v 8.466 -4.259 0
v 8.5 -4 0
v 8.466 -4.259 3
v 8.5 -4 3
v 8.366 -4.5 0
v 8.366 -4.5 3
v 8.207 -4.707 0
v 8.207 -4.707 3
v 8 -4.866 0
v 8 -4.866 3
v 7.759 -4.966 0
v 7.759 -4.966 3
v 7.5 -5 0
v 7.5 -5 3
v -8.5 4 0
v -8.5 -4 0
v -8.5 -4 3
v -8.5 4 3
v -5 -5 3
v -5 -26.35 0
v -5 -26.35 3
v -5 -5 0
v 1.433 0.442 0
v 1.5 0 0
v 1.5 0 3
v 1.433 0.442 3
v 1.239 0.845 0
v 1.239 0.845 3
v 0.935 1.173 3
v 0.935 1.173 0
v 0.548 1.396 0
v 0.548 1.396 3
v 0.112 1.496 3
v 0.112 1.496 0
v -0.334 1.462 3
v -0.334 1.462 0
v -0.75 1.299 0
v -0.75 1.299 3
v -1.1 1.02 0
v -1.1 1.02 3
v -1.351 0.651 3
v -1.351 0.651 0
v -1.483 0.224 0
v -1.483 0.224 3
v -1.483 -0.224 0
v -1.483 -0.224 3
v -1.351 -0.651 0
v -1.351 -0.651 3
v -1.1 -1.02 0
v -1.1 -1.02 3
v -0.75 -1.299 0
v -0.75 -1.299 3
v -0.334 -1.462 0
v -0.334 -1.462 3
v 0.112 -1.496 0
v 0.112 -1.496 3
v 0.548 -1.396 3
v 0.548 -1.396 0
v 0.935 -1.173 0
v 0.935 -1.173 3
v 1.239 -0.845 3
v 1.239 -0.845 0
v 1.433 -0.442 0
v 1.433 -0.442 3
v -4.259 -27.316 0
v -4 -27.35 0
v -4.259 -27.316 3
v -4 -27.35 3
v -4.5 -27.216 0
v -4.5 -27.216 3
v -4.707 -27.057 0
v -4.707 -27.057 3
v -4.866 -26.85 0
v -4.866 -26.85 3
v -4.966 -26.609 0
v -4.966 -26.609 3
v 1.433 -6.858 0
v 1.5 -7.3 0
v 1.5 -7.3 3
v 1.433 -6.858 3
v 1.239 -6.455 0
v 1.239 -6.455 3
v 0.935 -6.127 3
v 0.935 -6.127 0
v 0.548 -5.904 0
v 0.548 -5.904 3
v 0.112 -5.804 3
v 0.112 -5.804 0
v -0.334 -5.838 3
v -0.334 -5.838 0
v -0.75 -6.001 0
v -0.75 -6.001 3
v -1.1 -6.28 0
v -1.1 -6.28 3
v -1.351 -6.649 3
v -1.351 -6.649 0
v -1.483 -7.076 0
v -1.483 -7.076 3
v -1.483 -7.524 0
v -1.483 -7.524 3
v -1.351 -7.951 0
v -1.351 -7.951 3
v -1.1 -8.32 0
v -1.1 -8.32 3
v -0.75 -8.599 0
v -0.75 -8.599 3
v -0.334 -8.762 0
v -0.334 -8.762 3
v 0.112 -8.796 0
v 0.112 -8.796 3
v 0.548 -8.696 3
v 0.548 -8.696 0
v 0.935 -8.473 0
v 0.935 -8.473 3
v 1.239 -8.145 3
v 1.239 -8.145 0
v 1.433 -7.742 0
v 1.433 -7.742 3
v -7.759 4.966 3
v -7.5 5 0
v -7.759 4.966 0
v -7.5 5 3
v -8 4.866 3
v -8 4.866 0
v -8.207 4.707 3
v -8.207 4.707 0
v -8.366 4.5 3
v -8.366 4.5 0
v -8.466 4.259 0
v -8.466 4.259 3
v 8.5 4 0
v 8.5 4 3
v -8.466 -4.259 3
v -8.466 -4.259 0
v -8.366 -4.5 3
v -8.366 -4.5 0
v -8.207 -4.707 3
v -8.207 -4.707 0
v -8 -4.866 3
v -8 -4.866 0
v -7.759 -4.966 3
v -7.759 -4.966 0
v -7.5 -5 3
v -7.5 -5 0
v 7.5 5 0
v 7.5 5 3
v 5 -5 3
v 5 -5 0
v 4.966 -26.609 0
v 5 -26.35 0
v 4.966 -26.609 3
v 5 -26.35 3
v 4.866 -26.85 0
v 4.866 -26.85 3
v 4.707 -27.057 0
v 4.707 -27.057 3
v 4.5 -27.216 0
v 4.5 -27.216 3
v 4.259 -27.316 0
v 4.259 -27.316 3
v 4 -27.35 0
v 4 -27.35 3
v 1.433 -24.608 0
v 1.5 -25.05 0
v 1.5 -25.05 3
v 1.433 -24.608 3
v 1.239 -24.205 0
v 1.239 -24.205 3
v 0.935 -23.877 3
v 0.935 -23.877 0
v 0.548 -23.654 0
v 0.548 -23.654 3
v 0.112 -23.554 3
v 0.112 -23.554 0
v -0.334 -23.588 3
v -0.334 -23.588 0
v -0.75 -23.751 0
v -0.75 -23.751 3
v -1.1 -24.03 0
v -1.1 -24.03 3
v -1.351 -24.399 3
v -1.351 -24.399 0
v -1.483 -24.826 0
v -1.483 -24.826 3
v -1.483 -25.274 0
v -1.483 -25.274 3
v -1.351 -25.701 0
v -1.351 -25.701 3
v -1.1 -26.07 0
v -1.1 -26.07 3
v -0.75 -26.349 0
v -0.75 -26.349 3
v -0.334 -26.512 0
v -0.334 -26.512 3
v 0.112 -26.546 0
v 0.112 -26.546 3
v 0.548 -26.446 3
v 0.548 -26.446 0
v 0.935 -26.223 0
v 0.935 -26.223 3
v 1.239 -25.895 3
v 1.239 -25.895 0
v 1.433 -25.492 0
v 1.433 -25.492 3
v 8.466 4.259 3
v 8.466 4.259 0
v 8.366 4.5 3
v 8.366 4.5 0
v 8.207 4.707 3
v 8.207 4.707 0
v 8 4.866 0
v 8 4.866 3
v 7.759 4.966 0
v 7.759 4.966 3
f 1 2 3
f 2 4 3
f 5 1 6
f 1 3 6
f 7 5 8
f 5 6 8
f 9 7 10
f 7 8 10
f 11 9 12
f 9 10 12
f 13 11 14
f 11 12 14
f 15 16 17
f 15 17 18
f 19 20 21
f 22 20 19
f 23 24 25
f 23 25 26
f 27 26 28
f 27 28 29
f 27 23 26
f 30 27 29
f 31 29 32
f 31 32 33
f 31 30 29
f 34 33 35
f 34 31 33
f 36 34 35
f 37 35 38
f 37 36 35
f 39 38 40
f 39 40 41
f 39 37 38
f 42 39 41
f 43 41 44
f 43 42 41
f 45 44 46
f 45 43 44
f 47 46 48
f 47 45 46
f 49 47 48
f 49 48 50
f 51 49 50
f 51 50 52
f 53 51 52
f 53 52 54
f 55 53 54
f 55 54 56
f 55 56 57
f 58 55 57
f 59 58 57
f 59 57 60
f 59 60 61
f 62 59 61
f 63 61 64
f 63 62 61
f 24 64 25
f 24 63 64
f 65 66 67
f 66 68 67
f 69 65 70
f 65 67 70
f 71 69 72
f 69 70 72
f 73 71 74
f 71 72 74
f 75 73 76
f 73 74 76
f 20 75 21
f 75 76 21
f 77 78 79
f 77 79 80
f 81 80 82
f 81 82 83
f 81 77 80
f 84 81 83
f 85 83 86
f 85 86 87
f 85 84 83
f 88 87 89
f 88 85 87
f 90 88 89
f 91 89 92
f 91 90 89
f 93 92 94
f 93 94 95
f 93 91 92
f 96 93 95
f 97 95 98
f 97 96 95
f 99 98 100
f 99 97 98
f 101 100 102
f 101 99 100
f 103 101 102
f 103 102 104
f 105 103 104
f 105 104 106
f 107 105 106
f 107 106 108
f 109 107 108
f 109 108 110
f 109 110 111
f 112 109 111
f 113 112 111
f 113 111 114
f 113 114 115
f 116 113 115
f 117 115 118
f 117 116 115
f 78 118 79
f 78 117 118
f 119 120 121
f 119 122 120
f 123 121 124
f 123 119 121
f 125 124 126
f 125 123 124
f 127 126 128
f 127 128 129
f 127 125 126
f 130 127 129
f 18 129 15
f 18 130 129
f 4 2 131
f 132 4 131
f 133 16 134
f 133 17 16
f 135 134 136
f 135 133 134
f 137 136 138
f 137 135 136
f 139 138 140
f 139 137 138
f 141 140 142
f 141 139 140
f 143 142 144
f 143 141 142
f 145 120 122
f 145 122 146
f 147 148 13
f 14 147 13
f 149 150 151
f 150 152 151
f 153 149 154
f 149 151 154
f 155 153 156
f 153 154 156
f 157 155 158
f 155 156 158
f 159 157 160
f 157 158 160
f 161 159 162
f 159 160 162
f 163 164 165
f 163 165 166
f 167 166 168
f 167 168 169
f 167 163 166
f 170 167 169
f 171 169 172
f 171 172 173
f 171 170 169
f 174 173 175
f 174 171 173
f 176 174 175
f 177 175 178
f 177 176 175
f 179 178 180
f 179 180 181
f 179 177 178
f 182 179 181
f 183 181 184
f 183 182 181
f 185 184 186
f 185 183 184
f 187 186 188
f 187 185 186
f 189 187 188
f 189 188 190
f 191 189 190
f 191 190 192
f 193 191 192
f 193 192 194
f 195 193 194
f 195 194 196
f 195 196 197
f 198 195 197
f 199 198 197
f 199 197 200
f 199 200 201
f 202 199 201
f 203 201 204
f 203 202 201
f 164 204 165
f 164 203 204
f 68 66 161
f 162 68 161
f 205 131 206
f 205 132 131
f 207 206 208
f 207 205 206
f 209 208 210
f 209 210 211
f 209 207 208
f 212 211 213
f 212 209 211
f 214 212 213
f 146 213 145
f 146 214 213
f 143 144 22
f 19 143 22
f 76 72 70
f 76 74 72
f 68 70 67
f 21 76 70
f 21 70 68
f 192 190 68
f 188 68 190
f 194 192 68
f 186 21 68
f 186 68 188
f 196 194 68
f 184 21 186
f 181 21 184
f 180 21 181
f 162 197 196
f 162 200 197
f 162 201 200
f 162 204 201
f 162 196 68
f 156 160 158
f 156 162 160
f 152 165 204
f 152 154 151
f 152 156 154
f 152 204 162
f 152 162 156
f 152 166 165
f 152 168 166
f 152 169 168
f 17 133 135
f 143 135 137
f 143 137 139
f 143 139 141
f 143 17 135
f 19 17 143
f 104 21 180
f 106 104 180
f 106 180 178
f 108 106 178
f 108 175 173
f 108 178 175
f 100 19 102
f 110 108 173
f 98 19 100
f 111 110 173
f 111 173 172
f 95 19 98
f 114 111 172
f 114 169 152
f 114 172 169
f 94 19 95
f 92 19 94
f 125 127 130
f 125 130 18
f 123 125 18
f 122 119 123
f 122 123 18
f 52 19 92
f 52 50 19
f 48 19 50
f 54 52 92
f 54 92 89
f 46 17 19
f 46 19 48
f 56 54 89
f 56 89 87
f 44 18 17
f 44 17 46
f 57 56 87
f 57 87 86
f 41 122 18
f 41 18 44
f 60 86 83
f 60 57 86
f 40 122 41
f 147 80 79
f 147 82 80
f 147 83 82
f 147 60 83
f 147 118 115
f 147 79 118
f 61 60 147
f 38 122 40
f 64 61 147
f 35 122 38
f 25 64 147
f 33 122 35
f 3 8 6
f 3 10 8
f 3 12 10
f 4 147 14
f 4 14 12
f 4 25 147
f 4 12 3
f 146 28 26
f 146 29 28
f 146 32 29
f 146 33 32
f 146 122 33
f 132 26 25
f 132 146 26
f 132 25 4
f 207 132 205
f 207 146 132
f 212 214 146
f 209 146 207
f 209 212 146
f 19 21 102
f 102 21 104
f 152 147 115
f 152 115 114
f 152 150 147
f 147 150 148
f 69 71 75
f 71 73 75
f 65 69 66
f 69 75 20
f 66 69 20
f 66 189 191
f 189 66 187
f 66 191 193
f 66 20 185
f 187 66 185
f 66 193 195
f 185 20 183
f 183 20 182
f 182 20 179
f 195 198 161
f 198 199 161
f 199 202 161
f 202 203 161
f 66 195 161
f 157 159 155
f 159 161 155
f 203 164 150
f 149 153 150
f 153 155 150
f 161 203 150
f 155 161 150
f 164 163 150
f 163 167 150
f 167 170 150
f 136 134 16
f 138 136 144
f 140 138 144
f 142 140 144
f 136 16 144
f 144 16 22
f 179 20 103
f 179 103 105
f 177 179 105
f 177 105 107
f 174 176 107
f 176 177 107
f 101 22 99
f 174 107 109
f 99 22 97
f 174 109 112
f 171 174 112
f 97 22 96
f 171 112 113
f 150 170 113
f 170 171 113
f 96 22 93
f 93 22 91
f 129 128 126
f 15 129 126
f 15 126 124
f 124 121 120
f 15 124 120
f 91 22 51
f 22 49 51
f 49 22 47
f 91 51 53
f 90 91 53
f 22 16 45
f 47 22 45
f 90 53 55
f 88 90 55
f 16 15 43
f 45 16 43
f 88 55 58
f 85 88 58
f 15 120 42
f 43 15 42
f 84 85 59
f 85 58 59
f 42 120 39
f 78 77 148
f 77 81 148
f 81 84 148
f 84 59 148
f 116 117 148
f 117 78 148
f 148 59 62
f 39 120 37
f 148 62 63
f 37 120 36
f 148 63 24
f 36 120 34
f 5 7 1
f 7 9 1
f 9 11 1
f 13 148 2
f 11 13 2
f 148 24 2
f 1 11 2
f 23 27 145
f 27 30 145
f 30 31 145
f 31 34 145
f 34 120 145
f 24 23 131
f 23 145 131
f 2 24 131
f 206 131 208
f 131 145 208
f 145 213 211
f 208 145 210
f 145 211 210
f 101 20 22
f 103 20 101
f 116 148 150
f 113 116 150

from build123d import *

# Parameters (mm, degrees)
SKETCH2_W           = 17
SKETCH2_H           = 10
SKETCH2_R           = 1.5
SKETCH2_W_2         = 10
SKETCH2_H_2         = 22.35
BOSS_EXTRUDE1_DEPTH = 3
FILLET5_R           = 1
FILLET6_R           = 1
FILLET7_R           = 1


with BuildPart() as part:
    # Sketch2 → Boss-Extrude1 (new body)
    # profile 1 of 2: a face of its own
    with BuildSketch(Plane.XY):
        Rectangle(SKETCH2_W, SKETCH2_H)
        Circle(SKETCH2_R, mode=Mode.SUBTRACT)
    # profile 2 of 2: a face of its own
    with BuildSketch(Plane.XY):
        with Locations((0, -16.175)):
            Rectangle(SKETCH2_W_2, SKETCH2_H_2)
        with Locations((0, -7.3)):
            Circle(SKETCH2_R, mode=Mode.SUBTRACT)
        with Locations((0, -25.05)):
            Circle(SKETCH2_R, mode=Mode.SUBTRACT)
    extrude(amount=BOSS_EXTRUDE1_DEPTH)

    # Fillet5
    fillet5_edges = [part.edges().sort_by_distance(p)[0] for p in [
        (8.5, -5, 1.5),
    ]]
    fillet(fillet5_edges, radius=FILLET5_R)

    # Fillet6
    fillet6_edges = [part.edges().sort_by_distance(p)[0] for p in [
        (5, -27.35, 1.5),
        (-5, -27.35, 1.5),
        (-8.5, -5, 1.5),
    ]]
    fillet(fillet6_edges, radius=FILLET6_R)

    # Fillet7
    fillet7_edges = [part.edges().sort_by_distance(p)[0] for p in [
        (8.5, 5, 1.5),
        (-8.5, 5, 1.5),
    ]]
    fillet(fillet7_edges, radius=FILLET7_R)


solid = part.part
